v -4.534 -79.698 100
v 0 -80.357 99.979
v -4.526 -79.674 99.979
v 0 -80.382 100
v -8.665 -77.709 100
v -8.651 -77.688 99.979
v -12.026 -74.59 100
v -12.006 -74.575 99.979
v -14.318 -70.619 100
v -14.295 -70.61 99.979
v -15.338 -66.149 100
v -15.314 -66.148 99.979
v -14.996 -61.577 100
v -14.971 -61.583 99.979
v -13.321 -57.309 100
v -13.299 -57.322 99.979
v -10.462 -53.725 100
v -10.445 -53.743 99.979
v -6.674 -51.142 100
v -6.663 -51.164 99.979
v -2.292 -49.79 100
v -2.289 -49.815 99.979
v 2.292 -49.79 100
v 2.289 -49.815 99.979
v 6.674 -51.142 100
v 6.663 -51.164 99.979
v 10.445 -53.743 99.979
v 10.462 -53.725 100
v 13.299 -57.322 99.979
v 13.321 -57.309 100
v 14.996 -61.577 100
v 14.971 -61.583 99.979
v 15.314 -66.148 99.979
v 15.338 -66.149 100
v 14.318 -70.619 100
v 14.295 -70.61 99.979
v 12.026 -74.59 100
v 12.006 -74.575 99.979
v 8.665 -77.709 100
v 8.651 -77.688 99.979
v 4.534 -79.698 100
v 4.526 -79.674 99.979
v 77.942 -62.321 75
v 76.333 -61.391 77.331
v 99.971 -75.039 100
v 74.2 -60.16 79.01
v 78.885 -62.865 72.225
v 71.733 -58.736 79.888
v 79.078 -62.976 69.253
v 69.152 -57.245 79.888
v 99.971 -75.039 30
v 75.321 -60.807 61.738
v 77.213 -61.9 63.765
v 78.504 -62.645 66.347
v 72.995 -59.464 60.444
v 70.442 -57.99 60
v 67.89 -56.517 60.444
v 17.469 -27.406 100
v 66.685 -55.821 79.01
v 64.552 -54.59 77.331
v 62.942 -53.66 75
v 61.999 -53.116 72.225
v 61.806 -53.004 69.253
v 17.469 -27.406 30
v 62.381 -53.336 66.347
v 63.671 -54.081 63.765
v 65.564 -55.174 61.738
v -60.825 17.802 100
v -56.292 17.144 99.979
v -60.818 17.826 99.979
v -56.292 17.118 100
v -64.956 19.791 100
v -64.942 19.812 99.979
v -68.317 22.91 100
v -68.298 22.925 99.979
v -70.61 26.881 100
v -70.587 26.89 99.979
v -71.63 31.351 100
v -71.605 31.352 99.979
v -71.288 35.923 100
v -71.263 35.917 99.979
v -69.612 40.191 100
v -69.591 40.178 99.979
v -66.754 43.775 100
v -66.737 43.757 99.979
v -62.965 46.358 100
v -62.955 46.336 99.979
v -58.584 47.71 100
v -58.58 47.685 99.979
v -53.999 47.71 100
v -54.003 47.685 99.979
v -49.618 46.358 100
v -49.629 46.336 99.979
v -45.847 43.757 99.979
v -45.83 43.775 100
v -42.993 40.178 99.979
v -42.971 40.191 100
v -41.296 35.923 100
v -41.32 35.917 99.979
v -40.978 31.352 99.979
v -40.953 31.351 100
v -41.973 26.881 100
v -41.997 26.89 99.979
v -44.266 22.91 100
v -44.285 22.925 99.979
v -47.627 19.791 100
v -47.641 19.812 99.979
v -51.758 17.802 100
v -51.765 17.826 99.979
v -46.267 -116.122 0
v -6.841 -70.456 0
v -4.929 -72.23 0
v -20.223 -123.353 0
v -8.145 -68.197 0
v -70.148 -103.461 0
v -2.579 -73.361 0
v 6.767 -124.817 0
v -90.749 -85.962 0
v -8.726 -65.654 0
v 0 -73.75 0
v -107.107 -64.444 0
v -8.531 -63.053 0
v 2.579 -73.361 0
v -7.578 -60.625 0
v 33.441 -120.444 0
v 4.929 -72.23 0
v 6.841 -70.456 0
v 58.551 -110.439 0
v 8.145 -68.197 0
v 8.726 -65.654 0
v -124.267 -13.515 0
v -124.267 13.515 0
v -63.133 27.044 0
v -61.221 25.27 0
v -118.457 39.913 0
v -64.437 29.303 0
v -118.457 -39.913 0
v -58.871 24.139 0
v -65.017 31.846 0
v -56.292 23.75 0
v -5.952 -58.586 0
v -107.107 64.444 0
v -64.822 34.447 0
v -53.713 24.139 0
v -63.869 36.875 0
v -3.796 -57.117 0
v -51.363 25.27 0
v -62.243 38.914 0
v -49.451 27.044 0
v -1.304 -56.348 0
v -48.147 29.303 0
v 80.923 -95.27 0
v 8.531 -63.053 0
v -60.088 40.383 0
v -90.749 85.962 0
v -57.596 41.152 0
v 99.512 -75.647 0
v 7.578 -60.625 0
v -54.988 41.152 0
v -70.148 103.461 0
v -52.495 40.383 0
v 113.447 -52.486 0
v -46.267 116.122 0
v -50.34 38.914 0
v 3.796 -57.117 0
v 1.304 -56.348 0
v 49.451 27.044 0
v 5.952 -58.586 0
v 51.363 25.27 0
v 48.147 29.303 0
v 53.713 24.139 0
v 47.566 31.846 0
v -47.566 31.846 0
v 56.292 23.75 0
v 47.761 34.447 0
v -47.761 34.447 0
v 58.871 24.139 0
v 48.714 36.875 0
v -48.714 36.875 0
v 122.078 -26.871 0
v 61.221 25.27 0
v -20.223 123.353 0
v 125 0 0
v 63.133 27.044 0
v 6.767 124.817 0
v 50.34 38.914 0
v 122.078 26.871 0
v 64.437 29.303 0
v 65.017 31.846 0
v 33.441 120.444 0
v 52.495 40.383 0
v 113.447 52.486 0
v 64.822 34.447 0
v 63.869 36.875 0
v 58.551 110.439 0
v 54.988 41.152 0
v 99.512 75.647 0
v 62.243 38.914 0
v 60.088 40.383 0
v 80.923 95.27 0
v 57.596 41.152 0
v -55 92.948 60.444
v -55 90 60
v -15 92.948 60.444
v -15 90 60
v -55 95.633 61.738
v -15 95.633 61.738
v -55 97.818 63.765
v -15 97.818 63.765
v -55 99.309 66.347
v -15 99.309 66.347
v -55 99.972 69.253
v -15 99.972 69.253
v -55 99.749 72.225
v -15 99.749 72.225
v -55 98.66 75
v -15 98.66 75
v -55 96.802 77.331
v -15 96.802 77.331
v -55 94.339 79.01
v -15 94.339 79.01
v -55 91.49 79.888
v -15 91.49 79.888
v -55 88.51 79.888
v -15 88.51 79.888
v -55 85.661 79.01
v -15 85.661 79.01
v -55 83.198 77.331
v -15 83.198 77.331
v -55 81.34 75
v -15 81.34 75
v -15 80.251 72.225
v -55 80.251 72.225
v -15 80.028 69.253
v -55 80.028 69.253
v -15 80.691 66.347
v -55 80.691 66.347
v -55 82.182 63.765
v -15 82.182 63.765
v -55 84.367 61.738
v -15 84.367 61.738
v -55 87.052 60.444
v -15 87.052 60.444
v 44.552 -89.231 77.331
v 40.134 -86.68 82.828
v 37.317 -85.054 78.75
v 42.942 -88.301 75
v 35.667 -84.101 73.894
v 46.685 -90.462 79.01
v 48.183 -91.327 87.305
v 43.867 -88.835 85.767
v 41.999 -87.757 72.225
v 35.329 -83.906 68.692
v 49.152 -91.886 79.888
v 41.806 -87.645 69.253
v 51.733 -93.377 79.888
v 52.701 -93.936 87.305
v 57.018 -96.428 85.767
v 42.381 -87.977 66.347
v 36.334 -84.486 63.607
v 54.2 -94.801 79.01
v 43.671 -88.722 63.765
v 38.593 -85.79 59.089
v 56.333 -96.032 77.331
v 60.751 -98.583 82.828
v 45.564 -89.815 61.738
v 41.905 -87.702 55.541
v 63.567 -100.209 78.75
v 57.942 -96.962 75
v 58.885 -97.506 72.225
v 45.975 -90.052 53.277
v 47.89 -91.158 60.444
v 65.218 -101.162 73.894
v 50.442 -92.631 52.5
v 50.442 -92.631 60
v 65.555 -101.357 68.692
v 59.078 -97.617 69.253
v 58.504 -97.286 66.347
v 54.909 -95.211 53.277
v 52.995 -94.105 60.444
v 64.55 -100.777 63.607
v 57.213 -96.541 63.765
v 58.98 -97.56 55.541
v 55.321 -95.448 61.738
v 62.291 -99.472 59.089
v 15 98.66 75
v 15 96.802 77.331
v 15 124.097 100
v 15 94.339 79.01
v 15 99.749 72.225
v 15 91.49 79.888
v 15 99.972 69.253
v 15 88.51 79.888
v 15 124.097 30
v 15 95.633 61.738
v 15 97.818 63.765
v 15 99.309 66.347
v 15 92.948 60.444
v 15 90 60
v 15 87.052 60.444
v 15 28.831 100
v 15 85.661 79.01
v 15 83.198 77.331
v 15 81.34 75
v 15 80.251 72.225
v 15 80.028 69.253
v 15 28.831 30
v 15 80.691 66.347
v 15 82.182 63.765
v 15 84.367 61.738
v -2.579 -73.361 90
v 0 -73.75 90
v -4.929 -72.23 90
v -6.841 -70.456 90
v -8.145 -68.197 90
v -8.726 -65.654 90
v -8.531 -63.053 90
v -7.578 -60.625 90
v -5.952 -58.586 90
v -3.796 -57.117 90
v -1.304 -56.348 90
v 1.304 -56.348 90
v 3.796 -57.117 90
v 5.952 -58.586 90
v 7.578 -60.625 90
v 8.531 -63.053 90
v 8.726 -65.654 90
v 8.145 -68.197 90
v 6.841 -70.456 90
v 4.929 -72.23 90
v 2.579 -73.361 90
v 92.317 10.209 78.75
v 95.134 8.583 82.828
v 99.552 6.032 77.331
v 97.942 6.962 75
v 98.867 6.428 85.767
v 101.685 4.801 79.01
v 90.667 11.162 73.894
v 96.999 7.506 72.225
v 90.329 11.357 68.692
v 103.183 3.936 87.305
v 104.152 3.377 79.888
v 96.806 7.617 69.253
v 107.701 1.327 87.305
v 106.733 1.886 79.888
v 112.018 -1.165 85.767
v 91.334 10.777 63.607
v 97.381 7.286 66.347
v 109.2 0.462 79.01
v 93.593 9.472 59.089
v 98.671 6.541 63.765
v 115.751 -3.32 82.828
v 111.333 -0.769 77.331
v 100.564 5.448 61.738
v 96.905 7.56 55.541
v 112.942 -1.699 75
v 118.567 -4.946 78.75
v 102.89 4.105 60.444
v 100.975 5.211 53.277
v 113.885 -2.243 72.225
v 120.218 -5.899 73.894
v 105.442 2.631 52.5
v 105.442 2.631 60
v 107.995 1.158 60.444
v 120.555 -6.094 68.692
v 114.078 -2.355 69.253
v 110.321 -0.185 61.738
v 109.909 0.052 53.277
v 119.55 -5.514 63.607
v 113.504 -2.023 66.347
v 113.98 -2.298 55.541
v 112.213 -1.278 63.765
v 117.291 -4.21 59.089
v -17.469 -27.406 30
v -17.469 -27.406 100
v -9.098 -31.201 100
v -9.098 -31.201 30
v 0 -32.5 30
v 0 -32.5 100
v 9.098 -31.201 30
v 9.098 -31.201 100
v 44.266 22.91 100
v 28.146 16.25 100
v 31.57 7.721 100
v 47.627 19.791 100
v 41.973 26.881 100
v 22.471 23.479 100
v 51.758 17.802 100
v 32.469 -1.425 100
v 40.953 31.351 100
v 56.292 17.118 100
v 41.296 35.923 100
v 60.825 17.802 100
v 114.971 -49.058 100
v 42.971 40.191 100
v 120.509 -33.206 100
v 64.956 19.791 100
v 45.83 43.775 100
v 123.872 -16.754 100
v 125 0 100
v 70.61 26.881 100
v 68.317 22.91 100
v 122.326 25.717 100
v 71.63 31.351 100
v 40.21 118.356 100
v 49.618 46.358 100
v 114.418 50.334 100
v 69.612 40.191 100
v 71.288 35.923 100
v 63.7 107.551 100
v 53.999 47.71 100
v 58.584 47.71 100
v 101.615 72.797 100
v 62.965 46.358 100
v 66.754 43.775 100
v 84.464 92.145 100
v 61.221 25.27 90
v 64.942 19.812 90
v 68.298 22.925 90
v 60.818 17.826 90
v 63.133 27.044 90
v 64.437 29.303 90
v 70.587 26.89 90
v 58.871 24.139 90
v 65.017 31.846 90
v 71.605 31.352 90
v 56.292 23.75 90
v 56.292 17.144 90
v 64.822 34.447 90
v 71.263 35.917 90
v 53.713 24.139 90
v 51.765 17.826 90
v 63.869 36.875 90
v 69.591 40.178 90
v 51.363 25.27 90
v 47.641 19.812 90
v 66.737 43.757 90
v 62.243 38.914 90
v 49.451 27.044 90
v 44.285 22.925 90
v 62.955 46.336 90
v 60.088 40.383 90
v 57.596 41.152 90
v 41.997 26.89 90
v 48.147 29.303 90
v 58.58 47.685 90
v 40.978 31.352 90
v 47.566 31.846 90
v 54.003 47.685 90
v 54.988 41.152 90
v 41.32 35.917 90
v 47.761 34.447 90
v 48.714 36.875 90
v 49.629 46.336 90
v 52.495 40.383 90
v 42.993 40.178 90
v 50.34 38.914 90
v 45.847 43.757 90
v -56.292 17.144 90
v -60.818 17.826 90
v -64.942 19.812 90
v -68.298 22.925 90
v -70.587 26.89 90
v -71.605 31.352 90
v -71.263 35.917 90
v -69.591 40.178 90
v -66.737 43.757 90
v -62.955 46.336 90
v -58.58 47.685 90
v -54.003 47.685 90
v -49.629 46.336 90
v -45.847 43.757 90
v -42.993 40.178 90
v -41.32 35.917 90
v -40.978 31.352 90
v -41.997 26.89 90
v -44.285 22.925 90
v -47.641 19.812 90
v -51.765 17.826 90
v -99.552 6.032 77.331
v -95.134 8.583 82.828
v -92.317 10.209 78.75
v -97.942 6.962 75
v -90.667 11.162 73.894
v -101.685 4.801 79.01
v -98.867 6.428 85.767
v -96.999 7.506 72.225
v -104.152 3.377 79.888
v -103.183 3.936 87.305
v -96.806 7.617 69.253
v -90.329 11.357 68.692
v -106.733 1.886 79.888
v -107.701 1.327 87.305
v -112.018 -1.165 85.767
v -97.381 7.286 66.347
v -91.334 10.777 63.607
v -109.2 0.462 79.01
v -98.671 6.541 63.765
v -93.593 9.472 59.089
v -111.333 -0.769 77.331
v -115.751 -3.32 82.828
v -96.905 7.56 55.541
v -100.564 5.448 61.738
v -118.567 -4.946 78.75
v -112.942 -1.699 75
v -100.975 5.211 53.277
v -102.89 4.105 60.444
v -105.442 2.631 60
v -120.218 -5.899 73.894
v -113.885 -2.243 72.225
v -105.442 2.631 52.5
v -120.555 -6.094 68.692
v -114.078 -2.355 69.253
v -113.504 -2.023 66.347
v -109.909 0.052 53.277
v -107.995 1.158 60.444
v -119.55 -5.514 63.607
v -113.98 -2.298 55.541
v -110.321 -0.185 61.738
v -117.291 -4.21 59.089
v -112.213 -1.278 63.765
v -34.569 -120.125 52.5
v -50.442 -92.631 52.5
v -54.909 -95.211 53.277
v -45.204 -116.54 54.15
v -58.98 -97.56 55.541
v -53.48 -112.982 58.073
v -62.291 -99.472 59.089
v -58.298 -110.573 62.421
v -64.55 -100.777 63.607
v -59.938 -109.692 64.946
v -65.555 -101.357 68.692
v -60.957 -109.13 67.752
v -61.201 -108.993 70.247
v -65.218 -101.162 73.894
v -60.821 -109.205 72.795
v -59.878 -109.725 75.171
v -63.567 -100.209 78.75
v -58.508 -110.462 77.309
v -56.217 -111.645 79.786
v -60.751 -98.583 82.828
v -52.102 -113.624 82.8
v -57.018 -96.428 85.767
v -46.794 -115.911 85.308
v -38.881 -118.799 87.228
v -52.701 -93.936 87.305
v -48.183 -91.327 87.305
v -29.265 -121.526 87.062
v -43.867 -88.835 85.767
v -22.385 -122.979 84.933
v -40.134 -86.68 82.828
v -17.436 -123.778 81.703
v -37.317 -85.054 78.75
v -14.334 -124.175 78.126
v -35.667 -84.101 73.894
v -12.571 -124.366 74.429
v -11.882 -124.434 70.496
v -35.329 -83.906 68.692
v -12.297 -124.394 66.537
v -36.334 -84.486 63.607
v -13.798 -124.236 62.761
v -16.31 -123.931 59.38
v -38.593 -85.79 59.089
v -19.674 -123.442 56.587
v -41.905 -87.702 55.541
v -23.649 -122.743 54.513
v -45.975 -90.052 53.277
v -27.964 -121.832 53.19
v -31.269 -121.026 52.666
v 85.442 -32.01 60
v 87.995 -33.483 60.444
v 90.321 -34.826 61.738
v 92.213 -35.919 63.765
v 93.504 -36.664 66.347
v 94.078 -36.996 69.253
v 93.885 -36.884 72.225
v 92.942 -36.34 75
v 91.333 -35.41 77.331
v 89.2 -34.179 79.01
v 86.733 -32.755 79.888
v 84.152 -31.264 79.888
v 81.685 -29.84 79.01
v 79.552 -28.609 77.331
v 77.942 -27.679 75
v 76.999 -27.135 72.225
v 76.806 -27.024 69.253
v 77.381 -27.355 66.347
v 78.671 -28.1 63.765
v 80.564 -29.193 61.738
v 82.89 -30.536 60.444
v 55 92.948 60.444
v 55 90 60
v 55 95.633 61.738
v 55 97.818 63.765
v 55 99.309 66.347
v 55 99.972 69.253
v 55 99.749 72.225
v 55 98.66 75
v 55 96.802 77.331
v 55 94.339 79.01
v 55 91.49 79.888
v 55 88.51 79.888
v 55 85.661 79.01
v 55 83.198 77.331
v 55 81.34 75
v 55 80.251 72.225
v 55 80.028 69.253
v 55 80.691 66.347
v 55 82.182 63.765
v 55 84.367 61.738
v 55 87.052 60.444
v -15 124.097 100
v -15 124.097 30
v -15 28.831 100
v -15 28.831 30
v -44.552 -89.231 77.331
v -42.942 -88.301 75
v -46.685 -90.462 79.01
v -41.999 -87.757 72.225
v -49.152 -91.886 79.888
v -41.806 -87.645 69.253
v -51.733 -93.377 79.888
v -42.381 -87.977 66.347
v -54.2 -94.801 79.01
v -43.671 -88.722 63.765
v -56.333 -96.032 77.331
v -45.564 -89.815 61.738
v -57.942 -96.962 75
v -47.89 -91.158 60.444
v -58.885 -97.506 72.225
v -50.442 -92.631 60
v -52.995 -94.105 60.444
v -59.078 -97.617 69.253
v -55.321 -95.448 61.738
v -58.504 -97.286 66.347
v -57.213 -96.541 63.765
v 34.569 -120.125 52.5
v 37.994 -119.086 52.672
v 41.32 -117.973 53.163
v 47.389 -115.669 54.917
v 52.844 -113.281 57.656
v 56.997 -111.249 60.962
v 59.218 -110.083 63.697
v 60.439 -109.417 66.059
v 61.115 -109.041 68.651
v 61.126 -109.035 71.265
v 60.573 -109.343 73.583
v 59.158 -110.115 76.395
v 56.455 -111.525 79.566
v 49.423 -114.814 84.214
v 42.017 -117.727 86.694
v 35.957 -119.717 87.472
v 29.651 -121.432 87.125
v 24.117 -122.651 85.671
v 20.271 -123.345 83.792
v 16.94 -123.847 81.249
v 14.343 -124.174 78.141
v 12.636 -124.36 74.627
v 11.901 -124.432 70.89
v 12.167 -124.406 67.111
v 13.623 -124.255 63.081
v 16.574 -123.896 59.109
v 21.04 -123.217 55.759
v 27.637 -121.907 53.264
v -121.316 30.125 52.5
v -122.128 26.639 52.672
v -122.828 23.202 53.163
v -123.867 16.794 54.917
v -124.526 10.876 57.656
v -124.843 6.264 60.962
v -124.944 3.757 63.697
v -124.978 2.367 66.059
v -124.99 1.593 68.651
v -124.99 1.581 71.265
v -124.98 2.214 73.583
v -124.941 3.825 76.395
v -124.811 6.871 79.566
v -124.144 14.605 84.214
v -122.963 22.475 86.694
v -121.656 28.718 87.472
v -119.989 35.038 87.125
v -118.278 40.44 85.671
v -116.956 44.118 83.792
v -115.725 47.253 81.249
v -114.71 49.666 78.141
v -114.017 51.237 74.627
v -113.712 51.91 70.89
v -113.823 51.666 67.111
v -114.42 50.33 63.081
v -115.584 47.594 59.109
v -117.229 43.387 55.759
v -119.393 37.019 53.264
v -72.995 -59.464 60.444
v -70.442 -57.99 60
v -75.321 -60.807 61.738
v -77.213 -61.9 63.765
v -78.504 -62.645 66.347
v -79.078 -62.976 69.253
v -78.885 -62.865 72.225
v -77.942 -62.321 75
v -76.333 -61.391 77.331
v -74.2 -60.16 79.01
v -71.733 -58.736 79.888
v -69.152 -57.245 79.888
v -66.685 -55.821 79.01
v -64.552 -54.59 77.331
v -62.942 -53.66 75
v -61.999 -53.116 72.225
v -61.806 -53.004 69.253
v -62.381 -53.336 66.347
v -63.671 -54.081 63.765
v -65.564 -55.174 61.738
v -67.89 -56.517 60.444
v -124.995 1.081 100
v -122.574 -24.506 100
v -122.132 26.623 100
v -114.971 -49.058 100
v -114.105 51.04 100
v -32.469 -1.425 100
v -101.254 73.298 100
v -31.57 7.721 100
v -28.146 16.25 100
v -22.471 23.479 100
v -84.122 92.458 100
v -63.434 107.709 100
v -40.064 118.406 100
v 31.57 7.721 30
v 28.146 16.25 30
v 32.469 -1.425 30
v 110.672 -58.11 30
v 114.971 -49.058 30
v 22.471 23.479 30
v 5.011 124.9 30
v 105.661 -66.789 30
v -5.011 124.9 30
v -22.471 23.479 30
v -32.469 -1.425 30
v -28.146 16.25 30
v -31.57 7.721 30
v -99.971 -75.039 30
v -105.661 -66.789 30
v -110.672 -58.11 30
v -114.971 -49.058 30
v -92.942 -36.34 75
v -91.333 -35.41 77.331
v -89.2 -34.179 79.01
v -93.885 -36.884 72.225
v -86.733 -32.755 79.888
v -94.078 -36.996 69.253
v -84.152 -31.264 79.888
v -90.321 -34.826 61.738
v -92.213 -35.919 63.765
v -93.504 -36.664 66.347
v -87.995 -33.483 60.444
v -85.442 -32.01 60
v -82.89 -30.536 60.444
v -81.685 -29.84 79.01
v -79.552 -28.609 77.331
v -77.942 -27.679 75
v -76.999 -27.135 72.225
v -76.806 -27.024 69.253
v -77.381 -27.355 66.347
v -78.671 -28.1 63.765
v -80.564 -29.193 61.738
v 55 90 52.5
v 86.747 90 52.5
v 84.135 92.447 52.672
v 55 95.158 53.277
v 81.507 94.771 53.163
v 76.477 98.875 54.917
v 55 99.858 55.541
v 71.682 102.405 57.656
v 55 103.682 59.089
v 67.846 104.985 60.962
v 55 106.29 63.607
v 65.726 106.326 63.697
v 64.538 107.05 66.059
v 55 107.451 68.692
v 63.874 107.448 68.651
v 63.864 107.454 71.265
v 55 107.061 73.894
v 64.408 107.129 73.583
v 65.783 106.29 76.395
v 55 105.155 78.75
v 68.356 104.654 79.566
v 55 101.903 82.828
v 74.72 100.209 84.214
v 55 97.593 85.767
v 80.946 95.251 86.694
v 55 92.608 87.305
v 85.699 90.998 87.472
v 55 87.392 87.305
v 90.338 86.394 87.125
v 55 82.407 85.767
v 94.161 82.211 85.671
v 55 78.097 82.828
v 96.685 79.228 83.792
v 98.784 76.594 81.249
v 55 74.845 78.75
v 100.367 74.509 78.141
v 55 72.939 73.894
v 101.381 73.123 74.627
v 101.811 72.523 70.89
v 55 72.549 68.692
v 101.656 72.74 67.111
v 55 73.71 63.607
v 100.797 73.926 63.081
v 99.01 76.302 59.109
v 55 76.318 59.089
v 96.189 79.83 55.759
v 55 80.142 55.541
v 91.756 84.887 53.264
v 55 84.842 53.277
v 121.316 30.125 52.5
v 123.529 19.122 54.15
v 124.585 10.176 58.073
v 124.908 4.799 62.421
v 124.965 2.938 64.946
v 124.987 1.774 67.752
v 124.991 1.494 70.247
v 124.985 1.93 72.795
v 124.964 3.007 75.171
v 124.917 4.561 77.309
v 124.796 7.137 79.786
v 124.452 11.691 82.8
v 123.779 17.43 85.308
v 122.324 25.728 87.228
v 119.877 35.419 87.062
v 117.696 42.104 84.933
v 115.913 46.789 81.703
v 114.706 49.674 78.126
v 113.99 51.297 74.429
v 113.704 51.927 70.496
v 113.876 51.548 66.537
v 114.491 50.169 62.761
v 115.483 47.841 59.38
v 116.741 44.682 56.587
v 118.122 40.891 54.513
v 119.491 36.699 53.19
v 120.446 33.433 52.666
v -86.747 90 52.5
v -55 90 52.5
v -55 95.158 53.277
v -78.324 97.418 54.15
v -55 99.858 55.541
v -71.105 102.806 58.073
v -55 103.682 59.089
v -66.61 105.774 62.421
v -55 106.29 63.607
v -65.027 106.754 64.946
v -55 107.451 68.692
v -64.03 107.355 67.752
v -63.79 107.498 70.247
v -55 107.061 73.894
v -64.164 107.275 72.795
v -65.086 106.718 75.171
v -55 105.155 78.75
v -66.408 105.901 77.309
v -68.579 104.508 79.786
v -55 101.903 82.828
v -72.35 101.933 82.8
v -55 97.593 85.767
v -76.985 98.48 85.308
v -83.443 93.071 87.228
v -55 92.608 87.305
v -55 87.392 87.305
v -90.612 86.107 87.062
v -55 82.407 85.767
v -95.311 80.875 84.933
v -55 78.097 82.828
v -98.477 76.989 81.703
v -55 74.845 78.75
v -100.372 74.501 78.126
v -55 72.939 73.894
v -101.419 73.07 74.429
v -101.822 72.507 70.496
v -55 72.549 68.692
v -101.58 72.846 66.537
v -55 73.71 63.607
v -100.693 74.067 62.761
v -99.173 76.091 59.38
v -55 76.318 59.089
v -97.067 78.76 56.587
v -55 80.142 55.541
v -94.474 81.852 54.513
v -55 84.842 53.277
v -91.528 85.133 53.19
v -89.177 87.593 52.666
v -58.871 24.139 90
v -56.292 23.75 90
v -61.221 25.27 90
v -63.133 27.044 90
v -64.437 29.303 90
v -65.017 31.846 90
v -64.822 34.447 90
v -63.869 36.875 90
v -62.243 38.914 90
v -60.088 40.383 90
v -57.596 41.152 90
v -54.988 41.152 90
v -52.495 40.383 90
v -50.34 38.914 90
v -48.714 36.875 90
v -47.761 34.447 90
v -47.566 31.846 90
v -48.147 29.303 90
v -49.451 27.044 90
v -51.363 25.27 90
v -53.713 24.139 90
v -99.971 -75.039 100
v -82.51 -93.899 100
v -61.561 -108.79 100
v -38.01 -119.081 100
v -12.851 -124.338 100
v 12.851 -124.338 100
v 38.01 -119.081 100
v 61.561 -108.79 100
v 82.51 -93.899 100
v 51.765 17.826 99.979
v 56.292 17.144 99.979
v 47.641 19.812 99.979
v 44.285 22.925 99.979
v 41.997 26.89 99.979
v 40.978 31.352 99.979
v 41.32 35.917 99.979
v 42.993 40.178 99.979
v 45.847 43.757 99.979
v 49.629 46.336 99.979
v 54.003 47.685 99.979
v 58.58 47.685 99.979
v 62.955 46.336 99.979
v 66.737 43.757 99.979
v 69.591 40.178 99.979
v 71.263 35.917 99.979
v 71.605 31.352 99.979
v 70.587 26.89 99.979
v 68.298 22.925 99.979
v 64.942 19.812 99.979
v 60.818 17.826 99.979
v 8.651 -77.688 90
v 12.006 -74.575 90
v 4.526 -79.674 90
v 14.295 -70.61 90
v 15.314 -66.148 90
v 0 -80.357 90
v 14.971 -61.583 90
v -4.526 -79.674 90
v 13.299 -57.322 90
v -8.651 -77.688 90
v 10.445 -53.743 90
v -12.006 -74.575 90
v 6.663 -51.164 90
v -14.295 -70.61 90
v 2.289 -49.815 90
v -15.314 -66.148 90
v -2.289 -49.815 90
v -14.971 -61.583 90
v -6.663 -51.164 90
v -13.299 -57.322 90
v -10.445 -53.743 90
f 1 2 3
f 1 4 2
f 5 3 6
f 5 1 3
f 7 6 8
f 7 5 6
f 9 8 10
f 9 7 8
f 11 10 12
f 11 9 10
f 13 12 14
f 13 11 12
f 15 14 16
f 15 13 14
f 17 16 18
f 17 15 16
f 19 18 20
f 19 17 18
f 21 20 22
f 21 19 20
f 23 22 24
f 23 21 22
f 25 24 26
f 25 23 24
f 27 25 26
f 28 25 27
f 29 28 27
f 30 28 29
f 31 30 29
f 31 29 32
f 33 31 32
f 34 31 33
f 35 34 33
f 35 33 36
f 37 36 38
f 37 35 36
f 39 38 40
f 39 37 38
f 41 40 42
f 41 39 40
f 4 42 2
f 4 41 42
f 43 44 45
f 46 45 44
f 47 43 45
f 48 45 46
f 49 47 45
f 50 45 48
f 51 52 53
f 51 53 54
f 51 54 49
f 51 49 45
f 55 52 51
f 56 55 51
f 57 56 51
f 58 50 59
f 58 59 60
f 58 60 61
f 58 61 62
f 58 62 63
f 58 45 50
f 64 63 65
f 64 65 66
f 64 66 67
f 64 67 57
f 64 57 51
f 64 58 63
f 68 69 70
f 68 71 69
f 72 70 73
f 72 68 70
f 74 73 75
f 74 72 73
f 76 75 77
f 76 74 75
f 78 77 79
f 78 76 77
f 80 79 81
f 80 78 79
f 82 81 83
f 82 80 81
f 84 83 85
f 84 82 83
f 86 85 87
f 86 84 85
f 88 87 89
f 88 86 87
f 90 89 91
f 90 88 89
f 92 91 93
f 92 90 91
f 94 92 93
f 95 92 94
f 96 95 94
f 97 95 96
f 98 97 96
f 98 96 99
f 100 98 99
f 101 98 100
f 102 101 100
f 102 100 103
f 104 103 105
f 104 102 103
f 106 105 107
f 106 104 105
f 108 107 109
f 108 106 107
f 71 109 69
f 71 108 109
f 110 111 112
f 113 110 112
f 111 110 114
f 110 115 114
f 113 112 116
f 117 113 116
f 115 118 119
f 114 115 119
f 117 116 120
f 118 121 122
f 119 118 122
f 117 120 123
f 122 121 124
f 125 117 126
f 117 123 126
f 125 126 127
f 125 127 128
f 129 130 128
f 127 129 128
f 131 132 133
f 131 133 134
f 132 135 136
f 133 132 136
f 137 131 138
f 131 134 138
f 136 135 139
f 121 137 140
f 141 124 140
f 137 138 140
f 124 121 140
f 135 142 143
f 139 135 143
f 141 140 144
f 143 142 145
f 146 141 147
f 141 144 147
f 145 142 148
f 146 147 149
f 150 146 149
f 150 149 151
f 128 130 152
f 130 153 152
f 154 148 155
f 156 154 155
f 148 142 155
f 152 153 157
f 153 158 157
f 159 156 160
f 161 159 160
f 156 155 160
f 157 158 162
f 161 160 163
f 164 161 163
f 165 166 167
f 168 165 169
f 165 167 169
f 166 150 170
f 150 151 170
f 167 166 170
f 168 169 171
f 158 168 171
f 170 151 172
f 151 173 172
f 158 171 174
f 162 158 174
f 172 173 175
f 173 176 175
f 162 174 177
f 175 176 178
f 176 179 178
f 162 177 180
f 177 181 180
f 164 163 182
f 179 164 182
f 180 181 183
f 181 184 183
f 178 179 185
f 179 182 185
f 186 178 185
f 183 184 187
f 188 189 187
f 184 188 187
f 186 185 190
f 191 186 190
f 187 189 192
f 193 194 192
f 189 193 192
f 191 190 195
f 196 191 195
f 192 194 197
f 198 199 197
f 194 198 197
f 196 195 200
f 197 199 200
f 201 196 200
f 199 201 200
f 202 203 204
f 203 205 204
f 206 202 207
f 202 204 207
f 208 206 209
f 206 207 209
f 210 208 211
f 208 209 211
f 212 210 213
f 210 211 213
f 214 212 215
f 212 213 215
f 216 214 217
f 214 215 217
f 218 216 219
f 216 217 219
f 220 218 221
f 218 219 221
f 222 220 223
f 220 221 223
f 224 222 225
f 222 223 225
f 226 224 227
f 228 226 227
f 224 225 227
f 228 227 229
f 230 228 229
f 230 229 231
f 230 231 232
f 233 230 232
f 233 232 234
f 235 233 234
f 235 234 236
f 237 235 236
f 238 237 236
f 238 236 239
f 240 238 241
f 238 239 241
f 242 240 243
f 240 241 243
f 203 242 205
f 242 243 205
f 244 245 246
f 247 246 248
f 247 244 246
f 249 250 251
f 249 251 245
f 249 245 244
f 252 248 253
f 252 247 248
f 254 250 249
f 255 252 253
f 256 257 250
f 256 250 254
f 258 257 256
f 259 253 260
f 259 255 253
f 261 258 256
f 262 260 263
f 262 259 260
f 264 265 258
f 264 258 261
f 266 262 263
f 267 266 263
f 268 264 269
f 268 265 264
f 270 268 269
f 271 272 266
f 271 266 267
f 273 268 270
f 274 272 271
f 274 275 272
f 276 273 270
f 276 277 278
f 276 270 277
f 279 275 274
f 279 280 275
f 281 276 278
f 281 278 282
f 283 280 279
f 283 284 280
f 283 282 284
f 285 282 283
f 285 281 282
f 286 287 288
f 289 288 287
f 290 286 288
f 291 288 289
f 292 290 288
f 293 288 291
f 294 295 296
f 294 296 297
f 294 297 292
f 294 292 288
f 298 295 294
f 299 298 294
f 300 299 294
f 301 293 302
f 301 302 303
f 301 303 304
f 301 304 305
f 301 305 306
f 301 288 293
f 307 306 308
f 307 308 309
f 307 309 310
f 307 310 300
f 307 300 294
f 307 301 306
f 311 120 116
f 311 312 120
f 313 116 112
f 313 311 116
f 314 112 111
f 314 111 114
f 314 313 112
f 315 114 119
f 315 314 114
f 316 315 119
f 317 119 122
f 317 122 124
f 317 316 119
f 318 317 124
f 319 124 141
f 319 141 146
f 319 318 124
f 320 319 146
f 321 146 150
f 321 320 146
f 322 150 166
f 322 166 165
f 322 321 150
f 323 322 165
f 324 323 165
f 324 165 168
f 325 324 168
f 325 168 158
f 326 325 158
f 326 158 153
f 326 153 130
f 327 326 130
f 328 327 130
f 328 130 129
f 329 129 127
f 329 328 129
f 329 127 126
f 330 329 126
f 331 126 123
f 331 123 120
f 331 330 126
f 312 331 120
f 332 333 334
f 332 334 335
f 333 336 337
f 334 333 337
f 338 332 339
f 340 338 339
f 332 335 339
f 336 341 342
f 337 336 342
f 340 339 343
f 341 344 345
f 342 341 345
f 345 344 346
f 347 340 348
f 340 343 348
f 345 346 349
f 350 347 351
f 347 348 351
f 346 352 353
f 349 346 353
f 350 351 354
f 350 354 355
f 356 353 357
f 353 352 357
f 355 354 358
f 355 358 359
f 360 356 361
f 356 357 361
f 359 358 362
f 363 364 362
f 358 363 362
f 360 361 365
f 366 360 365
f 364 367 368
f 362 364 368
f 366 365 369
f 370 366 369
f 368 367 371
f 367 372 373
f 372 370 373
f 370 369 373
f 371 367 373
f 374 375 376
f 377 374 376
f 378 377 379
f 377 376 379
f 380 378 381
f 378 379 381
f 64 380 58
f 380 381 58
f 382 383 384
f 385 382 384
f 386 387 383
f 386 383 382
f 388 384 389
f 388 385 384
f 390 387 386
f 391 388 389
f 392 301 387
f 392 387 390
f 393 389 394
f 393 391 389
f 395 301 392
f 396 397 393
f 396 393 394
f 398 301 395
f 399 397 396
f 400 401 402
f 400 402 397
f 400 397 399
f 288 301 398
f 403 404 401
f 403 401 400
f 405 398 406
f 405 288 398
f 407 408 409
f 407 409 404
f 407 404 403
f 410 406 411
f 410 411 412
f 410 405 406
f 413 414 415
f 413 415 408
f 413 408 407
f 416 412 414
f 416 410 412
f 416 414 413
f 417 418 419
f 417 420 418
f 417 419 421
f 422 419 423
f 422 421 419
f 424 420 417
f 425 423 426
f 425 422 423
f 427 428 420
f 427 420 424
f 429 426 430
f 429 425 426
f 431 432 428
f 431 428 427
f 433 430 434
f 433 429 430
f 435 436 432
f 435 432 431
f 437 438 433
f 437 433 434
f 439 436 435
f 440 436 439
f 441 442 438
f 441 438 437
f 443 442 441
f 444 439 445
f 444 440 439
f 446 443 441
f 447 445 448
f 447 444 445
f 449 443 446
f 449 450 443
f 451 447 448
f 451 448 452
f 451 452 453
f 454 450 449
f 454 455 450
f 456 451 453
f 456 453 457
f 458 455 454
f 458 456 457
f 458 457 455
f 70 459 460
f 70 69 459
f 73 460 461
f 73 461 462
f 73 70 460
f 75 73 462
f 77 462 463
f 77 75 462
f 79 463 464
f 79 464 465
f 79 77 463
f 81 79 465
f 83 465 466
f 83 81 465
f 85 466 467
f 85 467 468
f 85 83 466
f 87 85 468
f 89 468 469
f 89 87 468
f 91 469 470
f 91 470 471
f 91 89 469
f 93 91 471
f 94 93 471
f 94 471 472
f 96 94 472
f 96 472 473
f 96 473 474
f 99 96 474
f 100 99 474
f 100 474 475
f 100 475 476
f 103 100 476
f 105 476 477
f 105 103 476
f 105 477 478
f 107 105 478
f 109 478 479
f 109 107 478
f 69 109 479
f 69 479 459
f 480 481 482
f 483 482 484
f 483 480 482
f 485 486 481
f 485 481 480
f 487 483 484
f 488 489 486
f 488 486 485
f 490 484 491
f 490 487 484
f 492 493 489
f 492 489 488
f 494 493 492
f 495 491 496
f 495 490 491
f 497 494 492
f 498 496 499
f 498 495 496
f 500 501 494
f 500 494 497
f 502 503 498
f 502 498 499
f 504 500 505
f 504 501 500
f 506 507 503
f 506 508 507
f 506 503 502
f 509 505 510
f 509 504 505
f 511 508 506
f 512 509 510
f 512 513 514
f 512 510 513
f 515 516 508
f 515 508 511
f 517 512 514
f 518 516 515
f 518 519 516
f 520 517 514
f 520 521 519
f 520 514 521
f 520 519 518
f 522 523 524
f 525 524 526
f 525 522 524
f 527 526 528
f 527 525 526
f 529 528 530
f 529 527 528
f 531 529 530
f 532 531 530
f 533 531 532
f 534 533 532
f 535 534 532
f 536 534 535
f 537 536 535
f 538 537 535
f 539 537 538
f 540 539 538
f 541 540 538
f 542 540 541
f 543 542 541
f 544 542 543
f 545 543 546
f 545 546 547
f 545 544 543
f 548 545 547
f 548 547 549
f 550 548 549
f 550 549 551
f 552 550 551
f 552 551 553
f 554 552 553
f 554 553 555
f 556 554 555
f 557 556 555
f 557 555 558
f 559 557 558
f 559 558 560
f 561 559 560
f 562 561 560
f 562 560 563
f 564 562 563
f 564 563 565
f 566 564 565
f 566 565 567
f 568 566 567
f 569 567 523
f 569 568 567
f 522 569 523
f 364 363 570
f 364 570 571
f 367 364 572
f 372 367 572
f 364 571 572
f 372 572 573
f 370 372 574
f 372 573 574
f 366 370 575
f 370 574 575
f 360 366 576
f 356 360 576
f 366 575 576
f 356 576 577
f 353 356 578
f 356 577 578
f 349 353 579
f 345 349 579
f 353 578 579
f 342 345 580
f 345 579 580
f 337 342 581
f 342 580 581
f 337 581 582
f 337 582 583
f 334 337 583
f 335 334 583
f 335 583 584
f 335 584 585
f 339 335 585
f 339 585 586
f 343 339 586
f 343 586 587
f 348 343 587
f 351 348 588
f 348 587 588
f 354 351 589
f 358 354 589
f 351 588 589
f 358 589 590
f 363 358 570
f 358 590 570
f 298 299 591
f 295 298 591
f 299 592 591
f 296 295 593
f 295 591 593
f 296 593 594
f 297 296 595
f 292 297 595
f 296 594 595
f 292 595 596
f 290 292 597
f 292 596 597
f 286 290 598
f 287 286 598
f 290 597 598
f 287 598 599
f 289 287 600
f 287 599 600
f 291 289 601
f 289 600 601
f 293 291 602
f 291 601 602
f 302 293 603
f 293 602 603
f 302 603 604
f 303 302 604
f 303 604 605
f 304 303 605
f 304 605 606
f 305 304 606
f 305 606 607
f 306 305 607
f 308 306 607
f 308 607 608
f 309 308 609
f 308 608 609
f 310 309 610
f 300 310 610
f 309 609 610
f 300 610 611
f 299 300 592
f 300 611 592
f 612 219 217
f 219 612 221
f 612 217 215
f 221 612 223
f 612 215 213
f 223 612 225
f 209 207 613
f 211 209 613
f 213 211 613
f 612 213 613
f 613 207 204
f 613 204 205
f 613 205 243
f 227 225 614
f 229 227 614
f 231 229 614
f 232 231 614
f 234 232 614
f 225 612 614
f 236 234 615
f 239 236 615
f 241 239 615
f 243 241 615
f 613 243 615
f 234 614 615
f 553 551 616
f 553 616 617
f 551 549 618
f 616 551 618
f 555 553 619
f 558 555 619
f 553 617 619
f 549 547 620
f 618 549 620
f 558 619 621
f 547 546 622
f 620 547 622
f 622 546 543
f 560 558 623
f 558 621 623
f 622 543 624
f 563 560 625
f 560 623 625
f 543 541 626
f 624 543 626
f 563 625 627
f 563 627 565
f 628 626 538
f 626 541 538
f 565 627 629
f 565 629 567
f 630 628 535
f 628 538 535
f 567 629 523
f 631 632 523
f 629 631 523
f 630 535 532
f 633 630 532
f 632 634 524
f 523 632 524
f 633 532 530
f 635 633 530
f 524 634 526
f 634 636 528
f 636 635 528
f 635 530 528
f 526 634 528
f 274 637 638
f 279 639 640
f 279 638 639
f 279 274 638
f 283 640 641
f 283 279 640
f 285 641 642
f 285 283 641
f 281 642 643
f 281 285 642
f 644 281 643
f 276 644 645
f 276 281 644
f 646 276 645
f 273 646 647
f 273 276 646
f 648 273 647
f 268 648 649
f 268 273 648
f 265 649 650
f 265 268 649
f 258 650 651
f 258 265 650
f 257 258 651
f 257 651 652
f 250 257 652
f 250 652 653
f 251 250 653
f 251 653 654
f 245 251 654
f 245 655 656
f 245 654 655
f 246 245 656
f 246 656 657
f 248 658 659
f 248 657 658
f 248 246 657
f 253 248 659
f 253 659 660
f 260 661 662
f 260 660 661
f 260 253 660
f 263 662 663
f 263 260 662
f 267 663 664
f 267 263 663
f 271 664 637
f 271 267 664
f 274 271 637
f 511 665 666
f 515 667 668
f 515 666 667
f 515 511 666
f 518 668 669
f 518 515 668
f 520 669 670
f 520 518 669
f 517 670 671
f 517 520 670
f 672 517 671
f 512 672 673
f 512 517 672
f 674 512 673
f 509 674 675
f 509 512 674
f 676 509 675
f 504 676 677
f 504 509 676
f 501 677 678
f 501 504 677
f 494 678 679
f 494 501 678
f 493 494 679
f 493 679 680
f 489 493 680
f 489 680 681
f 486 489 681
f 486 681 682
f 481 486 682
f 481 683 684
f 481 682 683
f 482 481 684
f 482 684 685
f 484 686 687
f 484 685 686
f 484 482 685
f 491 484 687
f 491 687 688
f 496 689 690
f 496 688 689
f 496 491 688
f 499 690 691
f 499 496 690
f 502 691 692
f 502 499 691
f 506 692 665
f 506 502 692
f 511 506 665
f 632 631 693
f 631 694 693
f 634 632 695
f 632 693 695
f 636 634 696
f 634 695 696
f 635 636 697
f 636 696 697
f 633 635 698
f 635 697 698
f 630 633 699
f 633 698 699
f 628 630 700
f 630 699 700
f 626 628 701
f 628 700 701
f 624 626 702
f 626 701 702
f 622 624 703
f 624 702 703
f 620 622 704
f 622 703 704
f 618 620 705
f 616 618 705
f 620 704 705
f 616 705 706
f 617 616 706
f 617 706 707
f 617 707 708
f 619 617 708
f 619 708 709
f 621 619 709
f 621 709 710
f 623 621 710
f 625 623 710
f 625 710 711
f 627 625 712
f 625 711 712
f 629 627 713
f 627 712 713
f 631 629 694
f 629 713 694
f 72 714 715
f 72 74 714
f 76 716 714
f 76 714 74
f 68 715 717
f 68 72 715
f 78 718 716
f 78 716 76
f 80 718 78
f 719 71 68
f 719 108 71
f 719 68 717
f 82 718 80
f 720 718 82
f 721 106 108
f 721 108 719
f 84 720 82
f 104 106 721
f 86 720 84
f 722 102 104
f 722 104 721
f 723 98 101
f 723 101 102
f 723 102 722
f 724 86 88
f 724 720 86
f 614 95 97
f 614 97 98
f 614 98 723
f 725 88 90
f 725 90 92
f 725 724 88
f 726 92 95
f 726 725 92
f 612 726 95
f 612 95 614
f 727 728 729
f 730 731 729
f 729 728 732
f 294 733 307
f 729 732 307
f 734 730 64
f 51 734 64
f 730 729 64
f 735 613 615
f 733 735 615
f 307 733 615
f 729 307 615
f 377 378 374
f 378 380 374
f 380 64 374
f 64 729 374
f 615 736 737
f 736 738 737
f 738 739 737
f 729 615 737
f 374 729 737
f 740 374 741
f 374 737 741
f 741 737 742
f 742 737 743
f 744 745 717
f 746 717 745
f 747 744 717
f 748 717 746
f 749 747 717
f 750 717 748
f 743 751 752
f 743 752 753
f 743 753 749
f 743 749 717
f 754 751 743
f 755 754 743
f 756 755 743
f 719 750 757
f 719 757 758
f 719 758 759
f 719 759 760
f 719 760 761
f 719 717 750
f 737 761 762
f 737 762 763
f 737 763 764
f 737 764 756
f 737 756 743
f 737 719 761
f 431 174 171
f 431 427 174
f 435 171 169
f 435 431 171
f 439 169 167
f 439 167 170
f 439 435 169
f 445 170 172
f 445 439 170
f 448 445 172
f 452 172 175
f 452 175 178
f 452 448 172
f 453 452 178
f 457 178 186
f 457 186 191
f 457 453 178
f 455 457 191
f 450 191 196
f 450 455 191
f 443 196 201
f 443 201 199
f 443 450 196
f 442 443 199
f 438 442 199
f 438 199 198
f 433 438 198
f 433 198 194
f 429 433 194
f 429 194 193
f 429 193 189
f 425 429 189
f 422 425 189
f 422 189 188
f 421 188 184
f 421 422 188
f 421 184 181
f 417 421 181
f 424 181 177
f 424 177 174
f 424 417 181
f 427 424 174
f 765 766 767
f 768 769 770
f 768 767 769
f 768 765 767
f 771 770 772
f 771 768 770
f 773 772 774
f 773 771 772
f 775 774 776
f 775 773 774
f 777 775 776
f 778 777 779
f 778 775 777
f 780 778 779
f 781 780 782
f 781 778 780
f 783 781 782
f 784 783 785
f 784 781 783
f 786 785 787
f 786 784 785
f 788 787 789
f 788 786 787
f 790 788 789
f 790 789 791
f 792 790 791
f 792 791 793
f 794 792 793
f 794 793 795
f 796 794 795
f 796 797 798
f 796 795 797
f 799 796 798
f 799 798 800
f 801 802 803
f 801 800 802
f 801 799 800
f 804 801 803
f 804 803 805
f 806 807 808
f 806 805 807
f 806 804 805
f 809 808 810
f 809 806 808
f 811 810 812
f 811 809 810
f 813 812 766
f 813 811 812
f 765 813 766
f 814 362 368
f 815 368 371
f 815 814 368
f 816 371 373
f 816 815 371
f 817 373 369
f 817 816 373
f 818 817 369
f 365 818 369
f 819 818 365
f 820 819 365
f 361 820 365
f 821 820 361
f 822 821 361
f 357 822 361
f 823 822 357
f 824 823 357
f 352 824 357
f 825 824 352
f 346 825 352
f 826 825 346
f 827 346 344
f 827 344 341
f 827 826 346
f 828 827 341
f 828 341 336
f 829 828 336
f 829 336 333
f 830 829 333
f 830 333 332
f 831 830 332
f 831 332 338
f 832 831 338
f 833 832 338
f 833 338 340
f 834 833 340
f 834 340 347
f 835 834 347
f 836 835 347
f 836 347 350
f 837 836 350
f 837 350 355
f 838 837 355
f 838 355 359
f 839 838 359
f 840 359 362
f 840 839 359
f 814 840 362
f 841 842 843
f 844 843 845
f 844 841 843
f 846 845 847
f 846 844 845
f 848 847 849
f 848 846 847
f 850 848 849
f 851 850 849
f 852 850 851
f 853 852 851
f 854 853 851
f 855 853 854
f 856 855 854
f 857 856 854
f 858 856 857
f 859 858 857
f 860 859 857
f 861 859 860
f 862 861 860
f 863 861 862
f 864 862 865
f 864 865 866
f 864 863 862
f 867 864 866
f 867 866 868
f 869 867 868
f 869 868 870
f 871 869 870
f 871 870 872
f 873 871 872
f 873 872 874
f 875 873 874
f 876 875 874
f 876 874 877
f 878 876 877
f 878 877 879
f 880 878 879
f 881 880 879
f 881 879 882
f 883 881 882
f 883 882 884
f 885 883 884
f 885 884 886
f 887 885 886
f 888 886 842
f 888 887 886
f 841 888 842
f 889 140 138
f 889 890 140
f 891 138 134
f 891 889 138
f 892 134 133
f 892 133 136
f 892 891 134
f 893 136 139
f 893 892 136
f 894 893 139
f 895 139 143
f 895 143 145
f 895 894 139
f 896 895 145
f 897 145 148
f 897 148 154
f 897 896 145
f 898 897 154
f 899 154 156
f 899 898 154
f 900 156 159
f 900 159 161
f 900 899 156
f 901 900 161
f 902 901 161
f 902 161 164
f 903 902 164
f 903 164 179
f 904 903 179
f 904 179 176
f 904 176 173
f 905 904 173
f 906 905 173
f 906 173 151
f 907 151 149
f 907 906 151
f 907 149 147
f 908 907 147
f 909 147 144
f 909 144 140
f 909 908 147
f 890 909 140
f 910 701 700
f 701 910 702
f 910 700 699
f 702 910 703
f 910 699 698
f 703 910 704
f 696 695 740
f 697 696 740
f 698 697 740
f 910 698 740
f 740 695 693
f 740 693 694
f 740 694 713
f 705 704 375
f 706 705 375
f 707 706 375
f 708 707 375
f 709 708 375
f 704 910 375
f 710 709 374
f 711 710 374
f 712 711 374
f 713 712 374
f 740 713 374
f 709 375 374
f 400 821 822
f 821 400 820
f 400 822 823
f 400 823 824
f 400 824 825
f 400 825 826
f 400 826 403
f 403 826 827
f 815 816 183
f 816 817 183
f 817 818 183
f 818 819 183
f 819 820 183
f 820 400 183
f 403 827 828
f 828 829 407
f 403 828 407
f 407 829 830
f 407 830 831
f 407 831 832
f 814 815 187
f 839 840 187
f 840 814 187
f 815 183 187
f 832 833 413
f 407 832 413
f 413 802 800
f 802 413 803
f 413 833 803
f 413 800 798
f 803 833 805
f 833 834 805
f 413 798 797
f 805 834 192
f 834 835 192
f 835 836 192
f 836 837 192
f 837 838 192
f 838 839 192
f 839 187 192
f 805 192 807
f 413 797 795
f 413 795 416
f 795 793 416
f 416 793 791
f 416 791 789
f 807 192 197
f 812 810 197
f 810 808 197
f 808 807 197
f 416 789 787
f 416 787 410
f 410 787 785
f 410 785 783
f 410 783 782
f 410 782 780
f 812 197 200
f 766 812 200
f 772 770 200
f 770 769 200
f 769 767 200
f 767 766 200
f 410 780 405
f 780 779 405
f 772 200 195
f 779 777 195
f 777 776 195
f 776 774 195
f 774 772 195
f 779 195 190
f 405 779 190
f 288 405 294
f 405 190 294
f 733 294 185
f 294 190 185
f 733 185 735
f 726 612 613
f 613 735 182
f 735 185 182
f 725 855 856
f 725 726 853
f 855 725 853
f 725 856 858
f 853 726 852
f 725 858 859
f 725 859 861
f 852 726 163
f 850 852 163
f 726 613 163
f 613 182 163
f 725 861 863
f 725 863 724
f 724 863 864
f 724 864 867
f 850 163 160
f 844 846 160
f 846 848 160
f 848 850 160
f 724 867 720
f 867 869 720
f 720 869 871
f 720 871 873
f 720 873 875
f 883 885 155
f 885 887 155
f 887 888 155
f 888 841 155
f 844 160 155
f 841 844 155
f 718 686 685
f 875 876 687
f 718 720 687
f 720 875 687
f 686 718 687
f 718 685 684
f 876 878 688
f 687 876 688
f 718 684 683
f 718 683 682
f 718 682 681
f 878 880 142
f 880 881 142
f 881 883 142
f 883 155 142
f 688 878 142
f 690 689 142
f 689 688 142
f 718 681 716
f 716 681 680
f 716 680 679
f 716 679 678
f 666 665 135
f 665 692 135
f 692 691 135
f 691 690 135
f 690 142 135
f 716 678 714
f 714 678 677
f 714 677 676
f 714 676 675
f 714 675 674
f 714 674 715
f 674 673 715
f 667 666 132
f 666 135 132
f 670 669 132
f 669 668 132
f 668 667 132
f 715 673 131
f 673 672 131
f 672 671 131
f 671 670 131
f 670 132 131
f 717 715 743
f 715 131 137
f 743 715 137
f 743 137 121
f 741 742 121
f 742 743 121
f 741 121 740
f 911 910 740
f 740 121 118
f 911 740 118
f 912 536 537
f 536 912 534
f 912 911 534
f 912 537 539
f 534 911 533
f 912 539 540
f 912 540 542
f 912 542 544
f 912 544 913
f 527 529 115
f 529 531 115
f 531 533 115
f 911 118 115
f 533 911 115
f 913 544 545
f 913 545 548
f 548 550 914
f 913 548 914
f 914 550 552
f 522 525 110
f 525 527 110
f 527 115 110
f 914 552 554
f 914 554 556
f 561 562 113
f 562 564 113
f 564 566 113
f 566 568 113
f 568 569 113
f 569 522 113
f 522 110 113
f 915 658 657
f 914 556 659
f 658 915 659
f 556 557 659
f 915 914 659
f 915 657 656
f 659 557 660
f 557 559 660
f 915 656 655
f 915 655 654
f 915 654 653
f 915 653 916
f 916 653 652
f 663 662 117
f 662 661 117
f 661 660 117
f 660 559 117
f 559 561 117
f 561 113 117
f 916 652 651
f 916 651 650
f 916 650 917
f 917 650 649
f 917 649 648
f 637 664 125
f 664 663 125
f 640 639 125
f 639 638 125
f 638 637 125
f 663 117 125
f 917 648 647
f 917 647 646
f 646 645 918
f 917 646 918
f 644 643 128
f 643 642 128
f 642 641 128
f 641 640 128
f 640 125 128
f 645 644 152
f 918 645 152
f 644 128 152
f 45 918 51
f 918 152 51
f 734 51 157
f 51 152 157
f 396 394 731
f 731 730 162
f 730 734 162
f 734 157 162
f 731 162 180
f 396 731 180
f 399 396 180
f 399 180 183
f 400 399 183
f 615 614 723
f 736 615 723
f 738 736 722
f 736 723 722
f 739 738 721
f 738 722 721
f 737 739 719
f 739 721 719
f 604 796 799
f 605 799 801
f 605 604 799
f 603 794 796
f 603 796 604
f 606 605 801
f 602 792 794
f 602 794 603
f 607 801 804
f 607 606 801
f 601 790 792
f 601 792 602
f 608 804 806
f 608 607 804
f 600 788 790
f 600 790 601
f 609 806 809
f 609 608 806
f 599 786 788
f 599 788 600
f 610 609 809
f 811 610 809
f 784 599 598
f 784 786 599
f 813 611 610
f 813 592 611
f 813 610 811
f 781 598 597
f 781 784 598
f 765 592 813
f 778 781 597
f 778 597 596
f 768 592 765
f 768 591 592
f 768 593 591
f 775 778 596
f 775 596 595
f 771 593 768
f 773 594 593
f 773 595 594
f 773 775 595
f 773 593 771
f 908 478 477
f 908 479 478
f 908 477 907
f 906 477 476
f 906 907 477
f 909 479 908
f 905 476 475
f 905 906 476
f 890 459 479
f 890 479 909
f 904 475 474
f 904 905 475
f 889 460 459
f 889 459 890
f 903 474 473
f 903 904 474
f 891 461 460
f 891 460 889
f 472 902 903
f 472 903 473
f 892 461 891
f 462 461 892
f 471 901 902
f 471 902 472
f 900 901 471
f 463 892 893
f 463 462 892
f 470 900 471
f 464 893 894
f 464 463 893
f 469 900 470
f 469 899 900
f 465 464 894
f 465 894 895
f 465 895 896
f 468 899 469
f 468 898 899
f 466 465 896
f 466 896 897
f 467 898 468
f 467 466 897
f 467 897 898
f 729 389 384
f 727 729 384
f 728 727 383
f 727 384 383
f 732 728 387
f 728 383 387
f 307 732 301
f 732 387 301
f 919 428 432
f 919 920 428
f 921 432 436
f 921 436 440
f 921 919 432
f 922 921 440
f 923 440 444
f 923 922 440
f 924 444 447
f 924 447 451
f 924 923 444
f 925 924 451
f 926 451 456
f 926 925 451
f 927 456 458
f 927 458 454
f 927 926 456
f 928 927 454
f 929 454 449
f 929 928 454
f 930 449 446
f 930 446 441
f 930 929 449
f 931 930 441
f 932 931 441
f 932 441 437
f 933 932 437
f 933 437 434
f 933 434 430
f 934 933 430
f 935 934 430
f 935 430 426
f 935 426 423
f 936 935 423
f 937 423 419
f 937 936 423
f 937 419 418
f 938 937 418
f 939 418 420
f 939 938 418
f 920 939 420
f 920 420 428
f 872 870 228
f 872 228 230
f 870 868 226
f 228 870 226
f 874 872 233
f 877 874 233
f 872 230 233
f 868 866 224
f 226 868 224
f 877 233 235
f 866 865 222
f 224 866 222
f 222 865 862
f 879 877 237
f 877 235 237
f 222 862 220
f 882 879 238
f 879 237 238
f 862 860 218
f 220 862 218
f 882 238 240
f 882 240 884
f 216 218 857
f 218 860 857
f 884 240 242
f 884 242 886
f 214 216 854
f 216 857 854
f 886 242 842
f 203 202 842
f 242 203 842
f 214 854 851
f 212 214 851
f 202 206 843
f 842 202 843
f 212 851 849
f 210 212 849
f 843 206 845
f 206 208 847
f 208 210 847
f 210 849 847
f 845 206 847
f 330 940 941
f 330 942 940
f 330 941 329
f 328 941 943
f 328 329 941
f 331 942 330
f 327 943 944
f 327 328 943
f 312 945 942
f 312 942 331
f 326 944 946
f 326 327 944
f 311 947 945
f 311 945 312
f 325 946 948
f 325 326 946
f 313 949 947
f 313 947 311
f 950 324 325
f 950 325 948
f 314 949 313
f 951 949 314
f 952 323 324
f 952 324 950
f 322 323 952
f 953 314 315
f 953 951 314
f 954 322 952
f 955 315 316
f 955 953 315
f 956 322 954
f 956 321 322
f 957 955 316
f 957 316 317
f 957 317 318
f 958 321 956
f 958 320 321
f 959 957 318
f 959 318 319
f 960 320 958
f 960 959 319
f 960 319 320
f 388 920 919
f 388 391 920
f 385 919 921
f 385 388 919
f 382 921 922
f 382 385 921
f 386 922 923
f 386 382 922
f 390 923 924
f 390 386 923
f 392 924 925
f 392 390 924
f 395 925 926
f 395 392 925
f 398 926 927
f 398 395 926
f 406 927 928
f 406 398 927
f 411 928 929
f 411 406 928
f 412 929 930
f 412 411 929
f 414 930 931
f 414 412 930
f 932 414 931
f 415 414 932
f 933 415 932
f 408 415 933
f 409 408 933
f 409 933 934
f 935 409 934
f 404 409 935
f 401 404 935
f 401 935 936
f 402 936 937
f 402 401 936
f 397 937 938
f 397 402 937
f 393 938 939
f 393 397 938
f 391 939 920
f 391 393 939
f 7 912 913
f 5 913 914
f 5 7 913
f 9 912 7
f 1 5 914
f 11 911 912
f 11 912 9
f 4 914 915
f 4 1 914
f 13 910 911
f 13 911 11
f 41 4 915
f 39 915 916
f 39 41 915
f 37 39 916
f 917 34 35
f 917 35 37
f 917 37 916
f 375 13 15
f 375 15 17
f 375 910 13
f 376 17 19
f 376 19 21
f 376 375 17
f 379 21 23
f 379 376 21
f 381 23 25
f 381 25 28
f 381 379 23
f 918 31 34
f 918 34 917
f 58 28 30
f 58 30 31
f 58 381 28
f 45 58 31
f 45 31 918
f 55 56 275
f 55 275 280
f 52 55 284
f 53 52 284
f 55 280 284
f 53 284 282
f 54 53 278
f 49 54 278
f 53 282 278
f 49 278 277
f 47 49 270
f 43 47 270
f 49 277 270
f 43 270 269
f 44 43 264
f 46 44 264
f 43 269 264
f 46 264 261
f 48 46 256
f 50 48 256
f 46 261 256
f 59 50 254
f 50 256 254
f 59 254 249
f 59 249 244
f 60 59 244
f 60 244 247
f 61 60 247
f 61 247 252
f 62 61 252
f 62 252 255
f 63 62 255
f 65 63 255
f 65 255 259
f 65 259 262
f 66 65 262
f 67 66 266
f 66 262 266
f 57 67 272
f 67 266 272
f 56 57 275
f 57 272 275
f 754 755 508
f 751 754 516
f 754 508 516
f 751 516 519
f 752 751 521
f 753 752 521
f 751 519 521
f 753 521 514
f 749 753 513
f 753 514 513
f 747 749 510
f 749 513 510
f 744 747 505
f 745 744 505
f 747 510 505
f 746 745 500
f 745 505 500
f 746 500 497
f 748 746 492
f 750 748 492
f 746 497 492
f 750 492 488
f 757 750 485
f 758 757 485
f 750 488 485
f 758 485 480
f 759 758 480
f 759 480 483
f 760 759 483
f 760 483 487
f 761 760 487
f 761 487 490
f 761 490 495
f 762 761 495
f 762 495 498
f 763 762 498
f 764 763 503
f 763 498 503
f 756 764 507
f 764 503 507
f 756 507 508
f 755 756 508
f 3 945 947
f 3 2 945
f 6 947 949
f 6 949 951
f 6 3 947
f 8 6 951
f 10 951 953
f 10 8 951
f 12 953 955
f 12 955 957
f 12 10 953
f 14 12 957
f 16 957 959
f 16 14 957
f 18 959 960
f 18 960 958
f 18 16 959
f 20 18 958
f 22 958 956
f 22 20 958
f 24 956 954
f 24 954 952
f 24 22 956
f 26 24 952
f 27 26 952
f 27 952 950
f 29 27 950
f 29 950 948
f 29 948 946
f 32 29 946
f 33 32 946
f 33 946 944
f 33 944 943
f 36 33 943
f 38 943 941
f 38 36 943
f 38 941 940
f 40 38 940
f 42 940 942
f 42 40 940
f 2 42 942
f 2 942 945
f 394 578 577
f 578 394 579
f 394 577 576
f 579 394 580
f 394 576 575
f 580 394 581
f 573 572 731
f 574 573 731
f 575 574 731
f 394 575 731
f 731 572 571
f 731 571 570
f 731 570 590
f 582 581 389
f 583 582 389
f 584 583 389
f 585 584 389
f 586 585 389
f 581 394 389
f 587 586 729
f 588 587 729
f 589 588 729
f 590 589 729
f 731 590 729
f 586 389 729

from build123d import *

# Parameters (mm, degrees)
BASE_SKETCH_R                            = 125
BASE_EXTRUDE_DEPTH                       = 100
TOP_THRU_HOLE_SKETCH_R                   = 10
SHANK_HOLE_EXTRUDED_CUT_DEPTH            = 204.100960116
OUTER_START                              = -101.827059
SKETCH2_6_R                              = 17.5
SKETCH2_6_R_2                            = 10
OUTER_SLEEVE_EXTRUDED_CUT_DEPTH          = 46.827059
OUTER_START_2                            = 55
TOP_THRU_HOLE_SKETCH_9_R                 = 17.5
OUTER_SLEEVE_EXTRUDED_CUT_2_DEPTH        = 46.827059
SLOTS_START                              = 100
SKETCH1_3_R                              = 32.5
SLOTS_EXTRUDED_CUT_DEPTH                 = 70
FRONT_START                              = 28.831406
SKETCH11_W                               = 30
SKETCH11_H                               = 70
FRONT_SLOT_EXTRUDED_CUT_DEPTH            = 96.168594
CIRCULAR_JAW_PATTERN_COUNT               = 3
COUNTERBORED_HOLE_CIRCULAR_PATTERN_COUNT = 3
CBORE_FOR_M16_HEX_HEAD_BOLT1_AT_2_COUNT  = 2
CBORE_FOR_M16_HEX_HEAD_BOLT1_AT_2_PITCH  = 112.583302492
CBORE_FOR_M16_HEX_HEAD_BOLT1_AT_3_COUNT  = 2
CBORE_FOR_M16_HEX_HEAD_BOLT1_AT_3_PITCH  = 112.583302492


with BuildPart() as part:
    # Base Sketch → Base Extrude (new body)
    with BuildSketch(Plane.XY):
        Circle(BASE_SKETCH_R)
    extrude(amount=BASE_EXTRUDE_DEPTH)

    # Top Thru Hole Sketch → Shank Hole Extruded Cut (cut, symmetric)
    with BuildSketch(Plane(origin=(0, 0, 0), x_dir=(0, 0, -1), z_dir=(1, 0, 0))):
        with Locations((-70, 90)):
            Circle(TOP_THRU_HOLE_SKETCH_R)
    shank_hole_extruded_cut = extrude(amount=SHANK_HOLE_EXTRUDED_CUT_DEPTH, both=True, mode=Mode.SUBTRACT)

    # Sketch2<6> → Outer Sleeve Extruded Cut (cut)
    with BuildSketch(Plane(origin=(0, 0, 0), x_dir=(0, 0, -1), z_dir=(1, 0, 0)).offset(OUTER_START)):
        with Locations((-70, 90)):
            Circle(SKETCH2_6_R)
        with Locations((-70, 90)):
            Circle(SKETCH2_6_R_2, mode=Mode.SUBTRACT)
    outer_sleeve_extruded_cut = extrude(amount=OUTER_SLEEVE_EXTRUDED_CUT_DEPTH, mode=Mode.SUBTRACT)

    # Top Thru Hole Sketch<9> → Outer Sleeve Extruded Cut 2 (cut)
    with BuildSketch(Plane(origin=(0, 0, 0), x_dir=(0, 0, -1), z_dir=(1, 0, 0)).offset(OUTER_START_2)):
        with Locations((-70, 90)):
            Circle(TOP_THRU_HOLE_SKETCH_9_R)
    outer_sleeve_extruded_cut_2 = extrude(amount=OUTER_SLEEVE_EXTRUDED_CUT_2_DEPTH, mode=Mode.SUBTRACT)

    # Sketch1<3> → Slots Extruded Cut (cut)
    with BuildSketch(Plane.XY.offset(SLOTS_START)):
        Circle(SKETCH1_3_R)
    extrude(amount=-SLOTS_EXTRUDED_CUT_DEPTH, mode=Mode.SUBTRACT)

    # Sketch11 → Front Slot Extruded Cut (cut)
    with BuildSketch(Plane(origin=(0, 0, 0), x_dir=(1, 0, 0), z_dir=(0, 1, 0)).offset(FRONT_START)):
        with Locations((0, -65)):
            Rectangle(SKETCH11_W, SKETCH11_H)
    front_slot_extruded_cut = extrude(amount=FRONT_SLOT_EXTRUDED_CUT_DEPTH, mode=Mode.SUBTRACT)

    # Circular Jaw Pattern: Front Slot Extruded Cut ×3 about axis
    circular_jaw_pattern_axis = Axis((0, 0, 0), (0, 0, 1))
    for i in range(1, CIRCULAR_JAW_PATTERN_COUNT):
        add(front_slot_extruded_cut.rotate(circular_jaw_pattern_axis, i * 360 / CIRCULAR_JAW_PATTERN_COUNT), mode=Mode.SUBTRACT)

    # Counterbored Hole Circular Pattern: Shank Hole Extruded Cut, Outer Sleeve Extruded Cut, Outer Sleeve Extruded Cut 2 ×3 about axis
    counterbored_hole_circular_pattern_axis = Axis((0, 0, 0), (0, 0, 1))
    add([shank_hole_extruded_cut.rotate(counterbored_hole_circular_pattern_axis, i * 360 / COUNTERBORED_HOLE_CIRCULAR_PATTERN_COUNT) for i in range(1, COUNTERBORED_HOLE_CIRCULAR_PATTERN_COUNT)], mode=Mode.SUBTRACT)
    add([outer_sleeve_extruded_cut.rotate(counterbored_hole_circular_pattern_axis, i * 360 / COUNTERBORED_HOLE_CIRCULAR_PATTERN_COUNT) for i in range(1, COUNTERBORED_HOLE_CIRCULAR_PATTERN_COUNT)], mode=Mode.SUBTRACT)
    add([outer_sleeve_extruded_cut_2.rotate(counterbored_hole_circular_pattern_axis, i * 360 / COUNTERBORED_HOLE_CIRCULAR_PATTERN_COUNT) for i in range(1, COUNTERBORED_HOLE_CIRCULAR_PATTERN_COUNT)], mode=Mode.SUBTRACT)

    # Sketch15 → CBORE for M16 Hex Head Bolt1 (revolve, cut)
    with BuildSketch(Plane(origin=(56.291651246, 32.5, 100), x_dir=(0, -1, 0), z_dir=(1, 0, 0))):
        Polygon((0, 0), (0, 100), (8.75, 100), (8.75, 10), (15.3565, 10), (15.3565, 0.020977491), (15.3815, 0), align=None)
    cbore_for_m16_hex_head_bolt1 = revolve(axis=Axis((56.291651246, 32.5, 106.35), (0, 0, -1)), mode=Mode.SUBTRACT)

    # CBORE for M16 Hex Head Bolt1 at 2: CBORE for M16 Hex Head Bolt1 ×2
    with Locations(*[Vector(-0.5000000000000011, -0.866025403784438, 0) * (i * CBORE_FOR_M16_HEX_HEAD_BOLT1_AT_2_PITCH) for i in range(1, CBORE_FOR_M16_HEX_HEAD_BOLT1_AT_2_COUNT)]):
        add(cbore_for_m16_hex_head_bolt1, mode=Mode.SUBTRACT)

    # CBORE for M16 Hex Head Bolt1 at 3: CBORE for M16 Hex Head Bolt1 ×2
    with Locations(*[(-i * CBORE_FOR_M16_HEX_HEAD_BOLT1_AT_3_PITCH, 0, 0) for i in range(1, CBORE_FOR_M16_HEX_HEAD_BOLT1_AT_3_COUNT)]):
        add(cbore_for_m16_hex_head_bolt1, mode=Mode.SUBTRACT)


solid = part.part
